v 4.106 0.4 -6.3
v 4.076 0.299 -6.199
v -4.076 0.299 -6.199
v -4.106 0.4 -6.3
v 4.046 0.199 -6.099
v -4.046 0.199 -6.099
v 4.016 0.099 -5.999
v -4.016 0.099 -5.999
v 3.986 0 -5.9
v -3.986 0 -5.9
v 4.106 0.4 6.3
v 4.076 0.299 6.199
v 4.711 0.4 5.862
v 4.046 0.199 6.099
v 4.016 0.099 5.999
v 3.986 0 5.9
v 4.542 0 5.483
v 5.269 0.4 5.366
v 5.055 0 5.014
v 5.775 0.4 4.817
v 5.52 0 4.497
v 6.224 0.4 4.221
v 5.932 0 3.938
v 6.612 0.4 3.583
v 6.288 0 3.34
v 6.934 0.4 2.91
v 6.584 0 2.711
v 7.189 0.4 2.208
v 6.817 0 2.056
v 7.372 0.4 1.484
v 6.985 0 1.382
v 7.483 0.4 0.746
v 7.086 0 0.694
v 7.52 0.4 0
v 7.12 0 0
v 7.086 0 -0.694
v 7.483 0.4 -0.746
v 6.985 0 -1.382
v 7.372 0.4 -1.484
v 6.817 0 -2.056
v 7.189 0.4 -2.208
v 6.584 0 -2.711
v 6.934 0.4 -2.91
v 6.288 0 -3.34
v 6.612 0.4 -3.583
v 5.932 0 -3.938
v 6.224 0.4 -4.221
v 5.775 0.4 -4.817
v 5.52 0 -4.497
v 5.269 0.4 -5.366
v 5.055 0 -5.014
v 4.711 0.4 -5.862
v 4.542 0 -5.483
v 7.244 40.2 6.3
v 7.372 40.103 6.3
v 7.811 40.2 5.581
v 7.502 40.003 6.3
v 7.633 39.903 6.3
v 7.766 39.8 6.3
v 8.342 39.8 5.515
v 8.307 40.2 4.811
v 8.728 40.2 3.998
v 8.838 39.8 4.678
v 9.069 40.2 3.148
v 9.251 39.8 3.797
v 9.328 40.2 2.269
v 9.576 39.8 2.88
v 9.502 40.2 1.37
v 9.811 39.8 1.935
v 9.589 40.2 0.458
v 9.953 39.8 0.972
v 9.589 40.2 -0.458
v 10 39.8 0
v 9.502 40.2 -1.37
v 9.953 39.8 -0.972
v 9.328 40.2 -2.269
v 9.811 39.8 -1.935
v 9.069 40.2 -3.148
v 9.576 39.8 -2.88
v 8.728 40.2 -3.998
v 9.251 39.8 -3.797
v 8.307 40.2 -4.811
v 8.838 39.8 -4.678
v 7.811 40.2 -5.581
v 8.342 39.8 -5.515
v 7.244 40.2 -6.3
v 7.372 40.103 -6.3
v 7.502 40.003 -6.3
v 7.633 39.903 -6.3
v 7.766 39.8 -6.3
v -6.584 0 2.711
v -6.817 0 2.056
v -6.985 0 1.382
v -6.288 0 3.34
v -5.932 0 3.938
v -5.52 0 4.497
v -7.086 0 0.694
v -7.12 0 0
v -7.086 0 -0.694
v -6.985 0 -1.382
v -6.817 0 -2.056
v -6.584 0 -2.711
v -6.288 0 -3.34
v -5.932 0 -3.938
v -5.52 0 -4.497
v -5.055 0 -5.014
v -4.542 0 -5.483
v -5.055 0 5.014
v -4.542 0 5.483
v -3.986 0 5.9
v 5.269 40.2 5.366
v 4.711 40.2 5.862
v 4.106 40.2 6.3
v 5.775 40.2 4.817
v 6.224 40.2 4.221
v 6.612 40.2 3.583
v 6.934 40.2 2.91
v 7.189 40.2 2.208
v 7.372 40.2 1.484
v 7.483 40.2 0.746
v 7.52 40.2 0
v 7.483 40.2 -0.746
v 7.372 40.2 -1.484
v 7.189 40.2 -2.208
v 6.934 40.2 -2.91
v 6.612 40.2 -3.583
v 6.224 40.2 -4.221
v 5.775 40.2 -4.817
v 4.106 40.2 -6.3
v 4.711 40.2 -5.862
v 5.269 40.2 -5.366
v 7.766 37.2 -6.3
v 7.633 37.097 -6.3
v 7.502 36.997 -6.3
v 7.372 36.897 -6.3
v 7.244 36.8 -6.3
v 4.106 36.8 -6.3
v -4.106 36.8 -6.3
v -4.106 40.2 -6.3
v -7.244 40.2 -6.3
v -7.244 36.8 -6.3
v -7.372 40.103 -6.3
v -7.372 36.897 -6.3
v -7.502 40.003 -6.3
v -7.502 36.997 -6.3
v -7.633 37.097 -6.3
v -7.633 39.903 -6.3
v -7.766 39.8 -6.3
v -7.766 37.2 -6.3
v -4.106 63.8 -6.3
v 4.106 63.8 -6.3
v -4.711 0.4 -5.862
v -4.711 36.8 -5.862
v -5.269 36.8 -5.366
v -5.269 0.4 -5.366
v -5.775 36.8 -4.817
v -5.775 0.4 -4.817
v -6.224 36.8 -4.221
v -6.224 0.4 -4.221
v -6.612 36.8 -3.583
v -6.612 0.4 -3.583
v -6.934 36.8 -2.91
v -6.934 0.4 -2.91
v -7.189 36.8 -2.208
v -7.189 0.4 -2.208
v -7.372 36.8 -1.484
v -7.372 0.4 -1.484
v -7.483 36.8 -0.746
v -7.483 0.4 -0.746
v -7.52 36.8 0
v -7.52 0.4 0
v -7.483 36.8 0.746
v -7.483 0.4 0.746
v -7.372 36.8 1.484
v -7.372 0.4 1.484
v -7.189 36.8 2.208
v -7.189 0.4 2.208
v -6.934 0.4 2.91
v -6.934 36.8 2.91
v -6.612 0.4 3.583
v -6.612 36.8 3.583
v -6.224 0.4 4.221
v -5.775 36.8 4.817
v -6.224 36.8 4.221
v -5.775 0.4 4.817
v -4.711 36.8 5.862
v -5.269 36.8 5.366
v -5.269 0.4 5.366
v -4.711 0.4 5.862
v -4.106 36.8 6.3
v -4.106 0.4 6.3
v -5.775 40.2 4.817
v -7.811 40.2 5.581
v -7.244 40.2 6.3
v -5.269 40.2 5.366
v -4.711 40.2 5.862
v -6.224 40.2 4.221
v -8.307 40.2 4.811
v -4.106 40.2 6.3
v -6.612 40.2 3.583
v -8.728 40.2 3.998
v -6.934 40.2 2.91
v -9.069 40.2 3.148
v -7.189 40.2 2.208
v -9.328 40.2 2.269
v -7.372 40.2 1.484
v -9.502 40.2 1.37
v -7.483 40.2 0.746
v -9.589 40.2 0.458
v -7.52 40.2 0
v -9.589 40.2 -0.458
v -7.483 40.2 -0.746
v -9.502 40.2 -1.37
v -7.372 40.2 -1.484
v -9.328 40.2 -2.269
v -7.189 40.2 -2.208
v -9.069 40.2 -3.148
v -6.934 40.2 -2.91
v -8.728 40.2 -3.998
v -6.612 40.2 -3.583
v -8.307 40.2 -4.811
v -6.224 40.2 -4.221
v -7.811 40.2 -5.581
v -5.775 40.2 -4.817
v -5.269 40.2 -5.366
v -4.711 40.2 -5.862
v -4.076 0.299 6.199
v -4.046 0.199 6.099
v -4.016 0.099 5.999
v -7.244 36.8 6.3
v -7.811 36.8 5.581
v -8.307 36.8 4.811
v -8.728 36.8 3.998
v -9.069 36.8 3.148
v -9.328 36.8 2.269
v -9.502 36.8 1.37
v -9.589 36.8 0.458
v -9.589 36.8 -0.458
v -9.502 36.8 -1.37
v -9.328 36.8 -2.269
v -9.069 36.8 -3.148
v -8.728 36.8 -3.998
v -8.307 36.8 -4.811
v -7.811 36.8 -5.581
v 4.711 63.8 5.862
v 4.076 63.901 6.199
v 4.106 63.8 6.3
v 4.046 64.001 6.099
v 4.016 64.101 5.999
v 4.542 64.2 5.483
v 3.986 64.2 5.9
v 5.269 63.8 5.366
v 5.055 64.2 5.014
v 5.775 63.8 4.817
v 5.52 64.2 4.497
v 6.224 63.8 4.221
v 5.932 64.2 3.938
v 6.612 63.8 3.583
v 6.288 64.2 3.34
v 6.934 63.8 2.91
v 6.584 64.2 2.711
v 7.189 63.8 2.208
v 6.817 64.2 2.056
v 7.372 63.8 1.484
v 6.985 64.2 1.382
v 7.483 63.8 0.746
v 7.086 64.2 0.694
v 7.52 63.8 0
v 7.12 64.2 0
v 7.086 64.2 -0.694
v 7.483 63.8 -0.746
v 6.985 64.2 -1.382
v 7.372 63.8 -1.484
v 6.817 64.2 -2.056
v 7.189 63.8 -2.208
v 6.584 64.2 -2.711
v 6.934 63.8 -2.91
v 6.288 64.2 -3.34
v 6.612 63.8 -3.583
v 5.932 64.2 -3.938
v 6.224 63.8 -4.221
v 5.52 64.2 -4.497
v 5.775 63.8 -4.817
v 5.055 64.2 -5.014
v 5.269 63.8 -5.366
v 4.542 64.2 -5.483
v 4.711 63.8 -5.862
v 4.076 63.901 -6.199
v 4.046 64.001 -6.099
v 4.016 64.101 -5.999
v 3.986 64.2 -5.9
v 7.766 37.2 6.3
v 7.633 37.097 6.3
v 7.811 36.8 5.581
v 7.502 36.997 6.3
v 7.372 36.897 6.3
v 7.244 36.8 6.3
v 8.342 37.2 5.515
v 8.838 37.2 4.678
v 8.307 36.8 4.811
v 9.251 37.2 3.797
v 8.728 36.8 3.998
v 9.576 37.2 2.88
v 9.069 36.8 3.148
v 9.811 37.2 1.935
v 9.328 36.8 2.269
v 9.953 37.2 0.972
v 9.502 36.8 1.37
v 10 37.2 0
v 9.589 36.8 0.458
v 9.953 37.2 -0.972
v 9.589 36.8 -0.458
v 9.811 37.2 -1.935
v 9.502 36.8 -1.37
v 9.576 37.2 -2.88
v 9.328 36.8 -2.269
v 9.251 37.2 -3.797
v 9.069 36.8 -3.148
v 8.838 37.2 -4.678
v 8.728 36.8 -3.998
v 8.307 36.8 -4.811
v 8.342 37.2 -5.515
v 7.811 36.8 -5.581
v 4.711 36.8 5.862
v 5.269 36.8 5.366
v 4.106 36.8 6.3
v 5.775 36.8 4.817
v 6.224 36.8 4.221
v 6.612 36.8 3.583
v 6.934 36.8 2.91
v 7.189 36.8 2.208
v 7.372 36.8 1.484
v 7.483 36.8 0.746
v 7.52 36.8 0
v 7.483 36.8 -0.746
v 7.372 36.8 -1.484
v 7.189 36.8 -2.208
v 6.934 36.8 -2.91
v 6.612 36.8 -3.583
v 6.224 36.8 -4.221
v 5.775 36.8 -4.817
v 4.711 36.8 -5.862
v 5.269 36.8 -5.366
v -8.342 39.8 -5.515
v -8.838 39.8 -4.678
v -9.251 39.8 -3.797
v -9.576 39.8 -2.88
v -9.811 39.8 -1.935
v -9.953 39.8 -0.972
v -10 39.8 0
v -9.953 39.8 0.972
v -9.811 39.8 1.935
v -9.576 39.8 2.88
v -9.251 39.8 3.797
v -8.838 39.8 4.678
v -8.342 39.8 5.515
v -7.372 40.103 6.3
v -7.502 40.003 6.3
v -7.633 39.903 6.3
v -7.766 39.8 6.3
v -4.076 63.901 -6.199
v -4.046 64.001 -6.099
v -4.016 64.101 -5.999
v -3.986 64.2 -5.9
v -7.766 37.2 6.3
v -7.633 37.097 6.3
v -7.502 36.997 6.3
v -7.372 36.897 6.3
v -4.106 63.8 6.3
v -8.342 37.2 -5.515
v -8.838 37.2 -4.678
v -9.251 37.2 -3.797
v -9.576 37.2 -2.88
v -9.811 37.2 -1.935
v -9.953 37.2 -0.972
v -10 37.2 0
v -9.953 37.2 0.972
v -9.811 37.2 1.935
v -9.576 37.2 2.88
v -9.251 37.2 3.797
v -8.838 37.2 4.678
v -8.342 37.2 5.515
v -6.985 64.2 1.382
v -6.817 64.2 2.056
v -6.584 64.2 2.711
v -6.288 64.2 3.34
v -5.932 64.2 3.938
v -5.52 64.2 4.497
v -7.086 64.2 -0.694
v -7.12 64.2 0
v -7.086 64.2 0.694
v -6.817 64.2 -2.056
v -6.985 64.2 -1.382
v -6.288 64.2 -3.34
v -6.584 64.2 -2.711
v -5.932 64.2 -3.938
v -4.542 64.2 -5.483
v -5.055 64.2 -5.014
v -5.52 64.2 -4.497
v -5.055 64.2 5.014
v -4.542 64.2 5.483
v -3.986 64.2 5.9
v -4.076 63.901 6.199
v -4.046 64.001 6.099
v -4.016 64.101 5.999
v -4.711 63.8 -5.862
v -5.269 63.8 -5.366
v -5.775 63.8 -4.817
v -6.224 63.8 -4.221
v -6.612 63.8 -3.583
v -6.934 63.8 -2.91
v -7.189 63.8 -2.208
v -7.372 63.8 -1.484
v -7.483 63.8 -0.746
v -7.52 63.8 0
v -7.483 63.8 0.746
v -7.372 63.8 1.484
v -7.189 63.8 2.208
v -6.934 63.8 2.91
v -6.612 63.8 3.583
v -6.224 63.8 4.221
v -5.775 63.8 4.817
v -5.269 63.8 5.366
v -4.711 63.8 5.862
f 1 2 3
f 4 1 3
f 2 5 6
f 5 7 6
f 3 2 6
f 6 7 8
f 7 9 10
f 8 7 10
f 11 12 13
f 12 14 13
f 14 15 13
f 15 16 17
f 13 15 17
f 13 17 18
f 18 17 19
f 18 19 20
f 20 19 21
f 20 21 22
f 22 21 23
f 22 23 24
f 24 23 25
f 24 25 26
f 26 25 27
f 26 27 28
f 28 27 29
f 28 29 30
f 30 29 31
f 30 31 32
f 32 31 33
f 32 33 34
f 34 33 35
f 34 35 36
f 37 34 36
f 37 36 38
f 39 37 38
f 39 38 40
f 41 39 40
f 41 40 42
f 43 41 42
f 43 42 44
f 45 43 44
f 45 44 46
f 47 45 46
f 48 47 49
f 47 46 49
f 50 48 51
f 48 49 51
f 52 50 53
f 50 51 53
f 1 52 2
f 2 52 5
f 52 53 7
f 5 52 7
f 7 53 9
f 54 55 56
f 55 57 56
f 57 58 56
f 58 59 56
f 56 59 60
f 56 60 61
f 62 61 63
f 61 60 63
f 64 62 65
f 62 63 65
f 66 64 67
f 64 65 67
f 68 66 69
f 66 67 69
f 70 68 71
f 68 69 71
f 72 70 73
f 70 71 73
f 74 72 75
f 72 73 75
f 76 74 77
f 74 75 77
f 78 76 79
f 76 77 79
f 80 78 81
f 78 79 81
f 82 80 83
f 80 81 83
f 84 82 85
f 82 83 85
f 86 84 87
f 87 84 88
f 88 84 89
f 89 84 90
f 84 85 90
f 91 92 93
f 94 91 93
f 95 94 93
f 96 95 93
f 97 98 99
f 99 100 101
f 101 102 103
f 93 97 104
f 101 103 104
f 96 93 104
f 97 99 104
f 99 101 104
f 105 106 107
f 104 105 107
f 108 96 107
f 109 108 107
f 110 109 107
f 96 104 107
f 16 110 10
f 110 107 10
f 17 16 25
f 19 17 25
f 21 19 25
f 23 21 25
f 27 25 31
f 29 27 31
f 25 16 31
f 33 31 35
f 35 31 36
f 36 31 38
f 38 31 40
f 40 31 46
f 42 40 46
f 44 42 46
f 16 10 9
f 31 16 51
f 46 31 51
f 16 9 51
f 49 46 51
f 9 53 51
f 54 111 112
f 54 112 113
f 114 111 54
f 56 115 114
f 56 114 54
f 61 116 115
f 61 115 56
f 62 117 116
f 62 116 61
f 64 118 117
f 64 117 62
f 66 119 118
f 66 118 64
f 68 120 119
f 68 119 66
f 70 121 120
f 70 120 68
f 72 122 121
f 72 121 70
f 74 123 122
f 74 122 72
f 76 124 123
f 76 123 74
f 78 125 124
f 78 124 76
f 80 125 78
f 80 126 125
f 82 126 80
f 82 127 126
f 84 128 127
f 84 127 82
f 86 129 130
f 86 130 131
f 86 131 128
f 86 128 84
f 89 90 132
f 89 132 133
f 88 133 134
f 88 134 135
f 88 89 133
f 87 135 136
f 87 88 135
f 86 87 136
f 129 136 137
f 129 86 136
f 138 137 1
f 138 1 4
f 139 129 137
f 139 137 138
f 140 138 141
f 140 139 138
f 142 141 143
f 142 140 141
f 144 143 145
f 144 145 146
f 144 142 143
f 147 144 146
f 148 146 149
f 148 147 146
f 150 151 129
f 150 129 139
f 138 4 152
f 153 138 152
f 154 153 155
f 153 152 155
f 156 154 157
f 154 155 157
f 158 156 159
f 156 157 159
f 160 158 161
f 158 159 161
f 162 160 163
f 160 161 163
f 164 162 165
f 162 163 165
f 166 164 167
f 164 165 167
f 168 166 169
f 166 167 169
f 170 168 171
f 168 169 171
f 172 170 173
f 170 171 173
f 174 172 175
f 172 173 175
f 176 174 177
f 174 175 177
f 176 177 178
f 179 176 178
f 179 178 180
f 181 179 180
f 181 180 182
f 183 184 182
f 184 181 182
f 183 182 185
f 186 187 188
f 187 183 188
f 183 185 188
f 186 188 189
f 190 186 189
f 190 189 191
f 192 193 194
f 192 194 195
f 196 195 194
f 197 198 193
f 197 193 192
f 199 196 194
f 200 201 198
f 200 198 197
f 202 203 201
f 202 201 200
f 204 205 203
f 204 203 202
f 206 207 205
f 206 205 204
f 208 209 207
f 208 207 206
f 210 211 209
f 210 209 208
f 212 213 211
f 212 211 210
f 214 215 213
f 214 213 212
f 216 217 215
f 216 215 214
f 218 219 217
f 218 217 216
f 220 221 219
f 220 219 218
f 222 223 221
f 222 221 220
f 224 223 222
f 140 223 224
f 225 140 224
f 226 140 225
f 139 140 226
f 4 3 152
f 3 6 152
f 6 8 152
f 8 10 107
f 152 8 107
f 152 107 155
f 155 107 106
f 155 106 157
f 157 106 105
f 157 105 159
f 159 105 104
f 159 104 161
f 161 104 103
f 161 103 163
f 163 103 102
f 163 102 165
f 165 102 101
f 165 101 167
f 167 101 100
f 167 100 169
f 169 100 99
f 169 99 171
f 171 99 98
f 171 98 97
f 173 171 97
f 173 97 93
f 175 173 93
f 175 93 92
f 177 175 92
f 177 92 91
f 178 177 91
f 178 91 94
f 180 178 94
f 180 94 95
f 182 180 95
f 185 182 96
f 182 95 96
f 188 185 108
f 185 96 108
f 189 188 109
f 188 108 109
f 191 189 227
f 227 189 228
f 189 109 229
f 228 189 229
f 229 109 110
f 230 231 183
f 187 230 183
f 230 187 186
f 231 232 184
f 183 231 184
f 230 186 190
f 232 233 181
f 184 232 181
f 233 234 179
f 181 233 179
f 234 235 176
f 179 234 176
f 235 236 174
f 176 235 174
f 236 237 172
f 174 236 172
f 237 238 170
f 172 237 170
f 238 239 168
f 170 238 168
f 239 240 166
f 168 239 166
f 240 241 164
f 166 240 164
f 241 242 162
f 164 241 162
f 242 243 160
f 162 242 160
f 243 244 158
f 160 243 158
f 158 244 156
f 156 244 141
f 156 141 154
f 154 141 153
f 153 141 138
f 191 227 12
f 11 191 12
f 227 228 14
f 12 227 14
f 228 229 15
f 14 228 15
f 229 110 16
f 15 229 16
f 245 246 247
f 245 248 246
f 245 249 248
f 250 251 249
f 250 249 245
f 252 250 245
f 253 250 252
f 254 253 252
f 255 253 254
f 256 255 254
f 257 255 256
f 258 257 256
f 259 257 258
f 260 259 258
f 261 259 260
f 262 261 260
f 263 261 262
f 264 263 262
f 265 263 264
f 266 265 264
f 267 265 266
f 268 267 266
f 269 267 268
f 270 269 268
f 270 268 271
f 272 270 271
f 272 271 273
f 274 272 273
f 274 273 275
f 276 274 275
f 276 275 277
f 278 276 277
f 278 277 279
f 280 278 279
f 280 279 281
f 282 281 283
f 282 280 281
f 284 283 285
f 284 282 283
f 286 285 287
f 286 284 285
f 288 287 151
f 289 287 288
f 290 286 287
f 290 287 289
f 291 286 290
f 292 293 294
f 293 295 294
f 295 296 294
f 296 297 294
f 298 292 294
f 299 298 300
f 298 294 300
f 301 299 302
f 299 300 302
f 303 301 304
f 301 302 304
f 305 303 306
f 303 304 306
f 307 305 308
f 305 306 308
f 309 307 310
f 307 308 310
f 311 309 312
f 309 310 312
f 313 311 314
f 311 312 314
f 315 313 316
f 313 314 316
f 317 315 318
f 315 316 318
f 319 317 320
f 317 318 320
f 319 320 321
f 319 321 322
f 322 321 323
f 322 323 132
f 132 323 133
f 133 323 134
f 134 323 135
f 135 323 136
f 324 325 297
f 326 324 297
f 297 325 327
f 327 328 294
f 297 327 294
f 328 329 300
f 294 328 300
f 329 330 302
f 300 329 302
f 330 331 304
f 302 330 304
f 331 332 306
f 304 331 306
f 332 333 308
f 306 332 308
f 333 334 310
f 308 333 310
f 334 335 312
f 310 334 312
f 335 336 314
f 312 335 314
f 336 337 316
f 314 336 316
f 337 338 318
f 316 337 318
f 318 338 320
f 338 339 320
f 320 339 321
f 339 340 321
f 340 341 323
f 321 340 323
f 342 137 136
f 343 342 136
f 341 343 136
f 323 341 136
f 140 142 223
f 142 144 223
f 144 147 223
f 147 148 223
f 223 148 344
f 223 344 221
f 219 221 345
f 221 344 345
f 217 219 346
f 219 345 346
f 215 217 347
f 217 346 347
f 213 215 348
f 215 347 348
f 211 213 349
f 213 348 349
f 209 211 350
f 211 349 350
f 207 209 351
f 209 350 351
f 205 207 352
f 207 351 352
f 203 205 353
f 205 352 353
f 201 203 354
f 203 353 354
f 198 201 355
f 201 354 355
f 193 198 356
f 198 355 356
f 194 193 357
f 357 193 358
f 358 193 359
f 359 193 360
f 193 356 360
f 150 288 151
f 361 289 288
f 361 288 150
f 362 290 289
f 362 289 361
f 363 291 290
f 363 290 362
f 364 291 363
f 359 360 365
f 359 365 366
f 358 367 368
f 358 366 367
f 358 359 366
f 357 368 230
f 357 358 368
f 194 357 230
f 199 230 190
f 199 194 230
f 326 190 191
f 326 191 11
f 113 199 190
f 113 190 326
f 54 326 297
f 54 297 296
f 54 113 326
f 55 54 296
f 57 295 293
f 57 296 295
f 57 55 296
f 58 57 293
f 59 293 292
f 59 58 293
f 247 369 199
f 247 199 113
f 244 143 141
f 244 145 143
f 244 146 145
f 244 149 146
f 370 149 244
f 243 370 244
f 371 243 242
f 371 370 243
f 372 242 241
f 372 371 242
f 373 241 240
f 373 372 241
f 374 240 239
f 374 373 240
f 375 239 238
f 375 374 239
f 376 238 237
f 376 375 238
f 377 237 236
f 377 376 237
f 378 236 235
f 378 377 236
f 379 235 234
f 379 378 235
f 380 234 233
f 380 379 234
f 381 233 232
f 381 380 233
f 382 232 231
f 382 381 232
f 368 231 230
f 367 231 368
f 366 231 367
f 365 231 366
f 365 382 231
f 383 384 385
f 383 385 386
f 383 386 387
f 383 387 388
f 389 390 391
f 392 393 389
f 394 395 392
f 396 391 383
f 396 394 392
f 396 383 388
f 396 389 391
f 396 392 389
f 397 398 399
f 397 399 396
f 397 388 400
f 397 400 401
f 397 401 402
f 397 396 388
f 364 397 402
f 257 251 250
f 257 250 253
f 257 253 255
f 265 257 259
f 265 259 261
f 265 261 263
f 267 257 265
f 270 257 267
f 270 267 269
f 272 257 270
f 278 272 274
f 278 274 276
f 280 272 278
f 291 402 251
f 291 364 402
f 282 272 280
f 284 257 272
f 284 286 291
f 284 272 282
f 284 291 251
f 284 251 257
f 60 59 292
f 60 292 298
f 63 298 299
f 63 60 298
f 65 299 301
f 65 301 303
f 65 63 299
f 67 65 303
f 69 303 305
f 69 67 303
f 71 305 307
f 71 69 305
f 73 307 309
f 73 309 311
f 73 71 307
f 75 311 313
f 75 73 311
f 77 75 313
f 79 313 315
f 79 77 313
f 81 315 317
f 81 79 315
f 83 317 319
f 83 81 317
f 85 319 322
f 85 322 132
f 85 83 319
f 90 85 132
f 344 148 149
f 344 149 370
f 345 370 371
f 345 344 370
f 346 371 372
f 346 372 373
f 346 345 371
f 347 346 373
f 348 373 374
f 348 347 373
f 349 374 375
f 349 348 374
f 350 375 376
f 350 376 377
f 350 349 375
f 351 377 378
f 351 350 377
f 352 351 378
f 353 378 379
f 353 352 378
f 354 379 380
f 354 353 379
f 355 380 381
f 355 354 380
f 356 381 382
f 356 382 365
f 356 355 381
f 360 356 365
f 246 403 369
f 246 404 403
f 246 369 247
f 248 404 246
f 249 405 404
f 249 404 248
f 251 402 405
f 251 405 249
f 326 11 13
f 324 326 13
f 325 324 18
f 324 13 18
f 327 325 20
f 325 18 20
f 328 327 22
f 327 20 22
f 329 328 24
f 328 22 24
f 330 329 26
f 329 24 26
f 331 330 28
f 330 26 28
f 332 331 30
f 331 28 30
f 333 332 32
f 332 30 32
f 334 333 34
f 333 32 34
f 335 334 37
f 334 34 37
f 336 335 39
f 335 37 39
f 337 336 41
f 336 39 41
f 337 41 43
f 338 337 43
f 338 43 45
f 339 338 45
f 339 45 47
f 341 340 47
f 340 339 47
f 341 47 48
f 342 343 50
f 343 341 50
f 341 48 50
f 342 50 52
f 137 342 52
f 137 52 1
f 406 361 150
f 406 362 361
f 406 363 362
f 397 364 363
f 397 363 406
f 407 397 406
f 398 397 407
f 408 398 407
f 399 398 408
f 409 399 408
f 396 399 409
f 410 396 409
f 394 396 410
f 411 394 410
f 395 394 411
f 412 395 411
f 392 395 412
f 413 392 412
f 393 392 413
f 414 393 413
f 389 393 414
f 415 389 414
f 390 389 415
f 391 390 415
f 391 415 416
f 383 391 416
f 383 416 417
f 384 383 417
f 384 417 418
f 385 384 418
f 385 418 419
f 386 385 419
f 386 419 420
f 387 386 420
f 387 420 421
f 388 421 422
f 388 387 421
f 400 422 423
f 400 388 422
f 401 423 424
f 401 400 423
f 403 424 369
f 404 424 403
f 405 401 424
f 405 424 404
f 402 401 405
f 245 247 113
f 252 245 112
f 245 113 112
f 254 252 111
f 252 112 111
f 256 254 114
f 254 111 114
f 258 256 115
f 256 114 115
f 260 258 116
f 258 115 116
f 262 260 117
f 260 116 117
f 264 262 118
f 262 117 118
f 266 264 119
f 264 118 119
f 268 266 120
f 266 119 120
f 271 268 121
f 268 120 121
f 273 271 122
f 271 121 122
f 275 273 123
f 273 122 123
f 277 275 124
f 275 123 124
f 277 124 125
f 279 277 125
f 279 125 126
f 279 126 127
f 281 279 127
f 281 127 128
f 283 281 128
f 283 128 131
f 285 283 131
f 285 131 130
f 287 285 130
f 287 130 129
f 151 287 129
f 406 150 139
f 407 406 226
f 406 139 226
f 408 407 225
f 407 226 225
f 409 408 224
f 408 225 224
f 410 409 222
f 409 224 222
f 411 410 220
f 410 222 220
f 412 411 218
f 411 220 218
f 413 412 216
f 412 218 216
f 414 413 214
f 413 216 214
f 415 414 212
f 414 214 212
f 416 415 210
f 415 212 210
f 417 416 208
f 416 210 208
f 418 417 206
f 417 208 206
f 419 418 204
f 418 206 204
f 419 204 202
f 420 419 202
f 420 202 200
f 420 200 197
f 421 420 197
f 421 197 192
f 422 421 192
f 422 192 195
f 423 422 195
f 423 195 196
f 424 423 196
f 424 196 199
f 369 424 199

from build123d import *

# Parameters (mm, degrees)
BOSS_EXTRUDE1_DEPTH = 64.2
CHAMFER1_SIZE       = 0.4
BOSS_EXTRUDE2_DEPTH = 3.4
CHAMFER2_SIZE       = 0.4


with BuildPart() as part:
    # Sketch1 → Boss-Extrude1 (new body)
    with BuildSketch(Plane(origin=(0, 0, 0), x_dir=(1, 0, 0), z_dir=(0, 1, 0))):
        with BuildLine():
            Line((-4.106141741, -6.3), (4.106141741, -6.3))
            ThreePointArc((4.106141741, -6.3), (7.52, 0), (4.106141741, 6.3))
            Line((4.106141741, 6.3), (-4.106141741, 6.3))
            ThreePointArc((-4.106141741, 6.3), (-7.52, 0), (-4.106141741, -6.3))
        make_face()
    extrude(amount=BOSS_EXTRUDE1_DEPTH)

    # Chamfer1
    chamfer1_edges = [part.edges().sort_by_distance(p)[0] for p in [
        (7.52, 64.2, 0),
        (0, 64.2, -6.3),
        (-7.52, 64.2, 0),
        (-7.52, 0, 0),
        (0, 64.2, 6.3),
        (0, 0, -6.3),
        (7.52, 0, 0),
        (0, 0, 6.3),
    ]]
    chamfer(chamfer1_edges, length=CHAMFER1_SIZE)

    # Sketch2 → Boss-Extrude2 (add)
    with BuildSketch(Plane(origin=(0, 40.2, 0), x_dir=(1, 0, 0), z_dir=(0, 1, 0))):
        with BuildLine():
            Line((-7.765951326, -6.3), (7.765951326, -6.3))
            ThreePointArc((7.765951326, -6.3), (10, 0), (7.765951326, 6.3))
            Line((7.765951326, 6.3), (-7.765951326, 6.3))
            ThreePointArc((-7.765951326, 6.3), (-10, 0), (-7.765951326, -6.3))
        make_face()
    extrude(amount=-BOSS_EXTRUDE2_DEPTH)

    # Chamfer2
    chamfer2_edges = [part.edges().sort_by_distance(p)[0] for p in [
        (10, 40.2, 0),
        (-10, 36.8, 0),
        (10, 36.8, 0),
        (-10, 40.2, 0),
    ]]
    chamfer(chamfer2_edges, length=CHAMFER2_SIZE)


solid = part.part
